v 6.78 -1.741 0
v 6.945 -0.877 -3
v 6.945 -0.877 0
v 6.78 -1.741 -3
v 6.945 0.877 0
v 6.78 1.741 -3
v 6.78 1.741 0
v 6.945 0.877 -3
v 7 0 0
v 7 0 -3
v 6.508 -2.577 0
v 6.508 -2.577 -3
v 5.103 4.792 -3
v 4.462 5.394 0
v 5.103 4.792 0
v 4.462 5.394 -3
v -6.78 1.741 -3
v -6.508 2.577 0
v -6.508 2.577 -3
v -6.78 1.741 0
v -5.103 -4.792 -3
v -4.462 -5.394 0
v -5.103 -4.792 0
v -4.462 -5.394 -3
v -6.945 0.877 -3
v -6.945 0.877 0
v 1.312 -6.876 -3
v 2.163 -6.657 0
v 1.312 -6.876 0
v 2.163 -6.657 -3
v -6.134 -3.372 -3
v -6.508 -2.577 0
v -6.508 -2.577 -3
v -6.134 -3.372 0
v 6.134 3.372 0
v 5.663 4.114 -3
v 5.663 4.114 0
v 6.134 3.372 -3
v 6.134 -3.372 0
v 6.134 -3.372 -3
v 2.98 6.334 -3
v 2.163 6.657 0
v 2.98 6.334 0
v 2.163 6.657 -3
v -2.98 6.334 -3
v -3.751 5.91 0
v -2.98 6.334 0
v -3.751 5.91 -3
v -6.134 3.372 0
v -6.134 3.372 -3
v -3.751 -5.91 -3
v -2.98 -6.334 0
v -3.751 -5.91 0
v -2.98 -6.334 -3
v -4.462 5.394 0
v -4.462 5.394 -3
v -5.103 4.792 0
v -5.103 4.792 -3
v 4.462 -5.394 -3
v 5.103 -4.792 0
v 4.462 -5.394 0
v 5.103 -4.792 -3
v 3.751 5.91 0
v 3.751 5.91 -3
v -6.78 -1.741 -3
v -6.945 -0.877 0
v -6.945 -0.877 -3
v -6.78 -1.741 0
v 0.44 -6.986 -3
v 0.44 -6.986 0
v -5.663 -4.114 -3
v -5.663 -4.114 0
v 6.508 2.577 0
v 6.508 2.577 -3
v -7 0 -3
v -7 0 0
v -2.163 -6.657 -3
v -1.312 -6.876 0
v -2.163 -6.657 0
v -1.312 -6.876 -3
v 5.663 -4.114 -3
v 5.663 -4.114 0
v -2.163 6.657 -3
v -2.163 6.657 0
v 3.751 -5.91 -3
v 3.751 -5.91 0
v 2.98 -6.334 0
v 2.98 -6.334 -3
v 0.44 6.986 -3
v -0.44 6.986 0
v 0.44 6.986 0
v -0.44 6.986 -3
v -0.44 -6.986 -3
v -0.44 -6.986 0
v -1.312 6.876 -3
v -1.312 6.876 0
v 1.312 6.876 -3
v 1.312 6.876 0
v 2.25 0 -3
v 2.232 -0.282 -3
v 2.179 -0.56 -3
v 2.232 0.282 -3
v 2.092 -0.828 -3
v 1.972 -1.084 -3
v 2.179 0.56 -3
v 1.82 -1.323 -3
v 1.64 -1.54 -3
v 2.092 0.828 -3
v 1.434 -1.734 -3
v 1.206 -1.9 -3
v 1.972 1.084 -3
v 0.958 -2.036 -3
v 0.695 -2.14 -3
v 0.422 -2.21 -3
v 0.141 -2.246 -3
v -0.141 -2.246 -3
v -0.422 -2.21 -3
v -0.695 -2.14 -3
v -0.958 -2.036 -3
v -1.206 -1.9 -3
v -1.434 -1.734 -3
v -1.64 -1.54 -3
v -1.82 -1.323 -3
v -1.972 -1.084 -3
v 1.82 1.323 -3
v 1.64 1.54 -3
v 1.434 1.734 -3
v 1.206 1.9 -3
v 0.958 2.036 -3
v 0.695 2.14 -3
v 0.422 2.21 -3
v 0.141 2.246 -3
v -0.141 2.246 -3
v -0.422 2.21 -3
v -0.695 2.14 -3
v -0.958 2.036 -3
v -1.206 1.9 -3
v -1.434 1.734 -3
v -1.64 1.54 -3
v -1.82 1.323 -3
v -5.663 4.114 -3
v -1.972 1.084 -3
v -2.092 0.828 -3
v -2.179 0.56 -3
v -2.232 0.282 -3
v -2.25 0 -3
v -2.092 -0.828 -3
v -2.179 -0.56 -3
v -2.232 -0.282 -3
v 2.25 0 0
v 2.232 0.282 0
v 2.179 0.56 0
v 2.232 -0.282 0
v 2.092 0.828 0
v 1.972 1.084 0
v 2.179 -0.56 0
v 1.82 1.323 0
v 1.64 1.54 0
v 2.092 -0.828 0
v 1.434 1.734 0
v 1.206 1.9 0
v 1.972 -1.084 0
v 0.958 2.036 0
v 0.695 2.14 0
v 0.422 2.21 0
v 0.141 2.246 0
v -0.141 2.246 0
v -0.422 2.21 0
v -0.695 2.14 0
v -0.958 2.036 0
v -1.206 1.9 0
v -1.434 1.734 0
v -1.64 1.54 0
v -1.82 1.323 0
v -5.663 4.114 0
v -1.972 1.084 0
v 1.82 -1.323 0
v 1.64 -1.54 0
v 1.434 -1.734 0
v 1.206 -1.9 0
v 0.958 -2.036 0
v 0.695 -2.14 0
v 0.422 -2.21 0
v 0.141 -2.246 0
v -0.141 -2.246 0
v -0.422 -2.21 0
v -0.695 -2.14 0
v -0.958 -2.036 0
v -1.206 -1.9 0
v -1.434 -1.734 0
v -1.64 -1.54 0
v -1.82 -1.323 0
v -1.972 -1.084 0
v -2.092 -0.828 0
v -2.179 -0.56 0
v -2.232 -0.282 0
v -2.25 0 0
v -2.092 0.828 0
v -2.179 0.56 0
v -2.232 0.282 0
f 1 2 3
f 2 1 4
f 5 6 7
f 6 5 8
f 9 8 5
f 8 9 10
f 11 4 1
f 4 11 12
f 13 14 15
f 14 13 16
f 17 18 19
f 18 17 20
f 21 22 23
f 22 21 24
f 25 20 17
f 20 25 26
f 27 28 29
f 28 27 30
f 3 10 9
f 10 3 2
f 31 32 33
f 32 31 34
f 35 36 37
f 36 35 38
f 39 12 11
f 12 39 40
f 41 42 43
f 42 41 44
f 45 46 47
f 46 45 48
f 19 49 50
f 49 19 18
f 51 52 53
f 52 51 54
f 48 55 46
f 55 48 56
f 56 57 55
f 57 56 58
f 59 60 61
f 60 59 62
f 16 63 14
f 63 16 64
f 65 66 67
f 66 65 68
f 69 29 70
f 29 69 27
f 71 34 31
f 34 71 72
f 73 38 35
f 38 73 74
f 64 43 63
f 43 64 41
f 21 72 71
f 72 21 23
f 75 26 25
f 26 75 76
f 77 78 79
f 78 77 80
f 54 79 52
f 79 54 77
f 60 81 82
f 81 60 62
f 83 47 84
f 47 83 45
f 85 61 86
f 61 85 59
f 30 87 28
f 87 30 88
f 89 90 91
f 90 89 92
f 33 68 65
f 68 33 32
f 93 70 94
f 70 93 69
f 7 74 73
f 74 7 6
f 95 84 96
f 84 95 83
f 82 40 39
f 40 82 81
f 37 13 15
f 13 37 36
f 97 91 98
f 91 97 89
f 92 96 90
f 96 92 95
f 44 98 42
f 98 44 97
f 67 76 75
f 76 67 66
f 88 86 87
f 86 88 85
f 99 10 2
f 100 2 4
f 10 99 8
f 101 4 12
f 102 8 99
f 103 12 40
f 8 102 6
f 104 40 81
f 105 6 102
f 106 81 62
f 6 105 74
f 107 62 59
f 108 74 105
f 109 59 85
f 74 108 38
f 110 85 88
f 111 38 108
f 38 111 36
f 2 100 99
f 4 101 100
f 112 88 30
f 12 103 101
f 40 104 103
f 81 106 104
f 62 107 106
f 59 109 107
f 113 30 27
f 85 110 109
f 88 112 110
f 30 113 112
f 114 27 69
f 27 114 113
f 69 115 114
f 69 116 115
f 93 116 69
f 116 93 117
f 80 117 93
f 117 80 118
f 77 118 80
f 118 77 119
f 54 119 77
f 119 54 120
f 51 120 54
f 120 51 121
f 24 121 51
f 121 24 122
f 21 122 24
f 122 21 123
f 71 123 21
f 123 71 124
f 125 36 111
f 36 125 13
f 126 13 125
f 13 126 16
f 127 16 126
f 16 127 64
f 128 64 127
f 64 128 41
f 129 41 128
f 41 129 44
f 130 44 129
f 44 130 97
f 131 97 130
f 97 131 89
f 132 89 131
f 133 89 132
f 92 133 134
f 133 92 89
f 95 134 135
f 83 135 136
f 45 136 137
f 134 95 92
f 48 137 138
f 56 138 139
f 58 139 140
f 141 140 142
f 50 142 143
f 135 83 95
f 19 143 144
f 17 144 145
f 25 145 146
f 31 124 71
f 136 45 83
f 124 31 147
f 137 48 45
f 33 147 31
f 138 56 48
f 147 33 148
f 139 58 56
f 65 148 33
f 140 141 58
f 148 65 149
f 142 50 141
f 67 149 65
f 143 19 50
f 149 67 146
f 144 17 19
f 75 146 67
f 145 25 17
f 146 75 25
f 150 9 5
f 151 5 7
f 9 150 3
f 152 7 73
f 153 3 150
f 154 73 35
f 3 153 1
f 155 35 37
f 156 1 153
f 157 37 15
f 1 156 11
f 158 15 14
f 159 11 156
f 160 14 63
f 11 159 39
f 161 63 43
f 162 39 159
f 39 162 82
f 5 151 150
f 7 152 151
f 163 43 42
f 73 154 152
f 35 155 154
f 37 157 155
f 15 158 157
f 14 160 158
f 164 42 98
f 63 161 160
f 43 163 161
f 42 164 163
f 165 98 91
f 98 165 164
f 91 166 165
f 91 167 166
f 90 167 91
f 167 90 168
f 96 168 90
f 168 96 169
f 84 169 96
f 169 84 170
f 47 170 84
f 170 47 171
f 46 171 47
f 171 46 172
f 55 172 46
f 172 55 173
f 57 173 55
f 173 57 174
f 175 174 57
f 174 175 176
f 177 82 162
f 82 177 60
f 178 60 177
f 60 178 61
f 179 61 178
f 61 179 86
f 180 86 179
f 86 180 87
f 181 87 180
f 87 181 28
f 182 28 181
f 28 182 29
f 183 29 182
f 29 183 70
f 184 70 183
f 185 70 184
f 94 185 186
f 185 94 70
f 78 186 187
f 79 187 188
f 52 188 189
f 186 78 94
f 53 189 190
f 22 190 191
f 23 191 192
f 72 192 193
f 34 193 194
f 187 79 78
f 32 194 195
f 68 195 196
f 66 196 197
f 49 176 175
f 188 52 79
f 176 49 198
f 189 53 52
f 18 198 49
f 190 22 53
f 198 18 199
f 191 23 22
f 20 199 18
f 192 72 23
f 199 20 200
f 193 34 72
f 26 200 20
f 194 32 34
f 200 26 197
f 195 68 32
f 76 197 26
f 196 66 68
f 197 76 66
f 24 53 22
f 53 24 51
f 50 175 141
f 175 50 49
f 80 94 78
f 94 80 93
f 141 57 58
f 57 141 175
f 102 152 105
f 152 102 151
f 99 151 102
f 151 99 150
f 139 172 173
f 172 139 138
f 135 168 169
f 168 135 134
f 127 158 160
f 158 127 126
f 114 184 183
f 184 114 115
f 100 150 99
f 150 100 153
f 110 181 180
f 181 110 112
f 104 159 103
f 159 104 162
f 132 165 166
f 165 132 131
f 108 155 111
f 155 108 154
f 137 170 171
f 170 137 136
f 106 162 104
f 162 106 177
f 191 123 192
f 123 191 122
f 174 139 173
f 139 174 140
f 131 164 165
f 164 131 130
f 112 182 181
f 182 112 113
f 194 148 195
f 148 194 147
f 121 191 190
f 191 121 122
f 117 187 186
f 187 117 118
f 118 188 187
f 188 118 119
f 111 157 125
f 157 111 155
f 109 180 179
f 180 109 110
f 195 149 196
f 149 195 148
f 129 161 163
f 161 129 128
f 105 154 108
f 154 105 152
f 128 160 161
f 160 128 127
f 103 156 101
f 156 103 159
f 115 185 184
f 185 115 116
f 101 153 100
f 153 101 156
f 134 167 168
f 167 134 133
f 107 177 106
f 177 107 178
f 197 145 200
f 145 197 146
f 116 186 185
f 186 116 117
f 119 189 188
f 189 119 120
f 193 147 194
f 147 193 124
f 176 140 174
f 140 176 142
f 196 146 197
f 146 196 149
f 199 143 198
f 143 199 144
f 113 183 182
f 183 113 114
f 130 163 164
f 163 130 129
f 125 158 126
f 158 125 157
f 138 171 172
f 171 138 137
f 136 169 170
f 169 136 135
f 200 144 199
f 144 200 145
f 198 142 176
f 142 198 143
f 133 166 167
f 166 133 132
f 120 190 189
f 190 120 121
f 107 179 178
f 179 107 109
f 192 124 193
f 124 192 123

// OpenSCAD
$fn = 50;


difference() {
	union() {
		translate(v = [0, 0, -3.0000000000]) {
			cylinder(h = 3, r = 7.0000000000);
		}
		cylinder(h = 0, r = 13.0000000000);
	}
	union() {
		#translate(v = [0, 0, -3]) {
			cylinder(h = 3, r = 2.2500000000);
		}
	}
}
